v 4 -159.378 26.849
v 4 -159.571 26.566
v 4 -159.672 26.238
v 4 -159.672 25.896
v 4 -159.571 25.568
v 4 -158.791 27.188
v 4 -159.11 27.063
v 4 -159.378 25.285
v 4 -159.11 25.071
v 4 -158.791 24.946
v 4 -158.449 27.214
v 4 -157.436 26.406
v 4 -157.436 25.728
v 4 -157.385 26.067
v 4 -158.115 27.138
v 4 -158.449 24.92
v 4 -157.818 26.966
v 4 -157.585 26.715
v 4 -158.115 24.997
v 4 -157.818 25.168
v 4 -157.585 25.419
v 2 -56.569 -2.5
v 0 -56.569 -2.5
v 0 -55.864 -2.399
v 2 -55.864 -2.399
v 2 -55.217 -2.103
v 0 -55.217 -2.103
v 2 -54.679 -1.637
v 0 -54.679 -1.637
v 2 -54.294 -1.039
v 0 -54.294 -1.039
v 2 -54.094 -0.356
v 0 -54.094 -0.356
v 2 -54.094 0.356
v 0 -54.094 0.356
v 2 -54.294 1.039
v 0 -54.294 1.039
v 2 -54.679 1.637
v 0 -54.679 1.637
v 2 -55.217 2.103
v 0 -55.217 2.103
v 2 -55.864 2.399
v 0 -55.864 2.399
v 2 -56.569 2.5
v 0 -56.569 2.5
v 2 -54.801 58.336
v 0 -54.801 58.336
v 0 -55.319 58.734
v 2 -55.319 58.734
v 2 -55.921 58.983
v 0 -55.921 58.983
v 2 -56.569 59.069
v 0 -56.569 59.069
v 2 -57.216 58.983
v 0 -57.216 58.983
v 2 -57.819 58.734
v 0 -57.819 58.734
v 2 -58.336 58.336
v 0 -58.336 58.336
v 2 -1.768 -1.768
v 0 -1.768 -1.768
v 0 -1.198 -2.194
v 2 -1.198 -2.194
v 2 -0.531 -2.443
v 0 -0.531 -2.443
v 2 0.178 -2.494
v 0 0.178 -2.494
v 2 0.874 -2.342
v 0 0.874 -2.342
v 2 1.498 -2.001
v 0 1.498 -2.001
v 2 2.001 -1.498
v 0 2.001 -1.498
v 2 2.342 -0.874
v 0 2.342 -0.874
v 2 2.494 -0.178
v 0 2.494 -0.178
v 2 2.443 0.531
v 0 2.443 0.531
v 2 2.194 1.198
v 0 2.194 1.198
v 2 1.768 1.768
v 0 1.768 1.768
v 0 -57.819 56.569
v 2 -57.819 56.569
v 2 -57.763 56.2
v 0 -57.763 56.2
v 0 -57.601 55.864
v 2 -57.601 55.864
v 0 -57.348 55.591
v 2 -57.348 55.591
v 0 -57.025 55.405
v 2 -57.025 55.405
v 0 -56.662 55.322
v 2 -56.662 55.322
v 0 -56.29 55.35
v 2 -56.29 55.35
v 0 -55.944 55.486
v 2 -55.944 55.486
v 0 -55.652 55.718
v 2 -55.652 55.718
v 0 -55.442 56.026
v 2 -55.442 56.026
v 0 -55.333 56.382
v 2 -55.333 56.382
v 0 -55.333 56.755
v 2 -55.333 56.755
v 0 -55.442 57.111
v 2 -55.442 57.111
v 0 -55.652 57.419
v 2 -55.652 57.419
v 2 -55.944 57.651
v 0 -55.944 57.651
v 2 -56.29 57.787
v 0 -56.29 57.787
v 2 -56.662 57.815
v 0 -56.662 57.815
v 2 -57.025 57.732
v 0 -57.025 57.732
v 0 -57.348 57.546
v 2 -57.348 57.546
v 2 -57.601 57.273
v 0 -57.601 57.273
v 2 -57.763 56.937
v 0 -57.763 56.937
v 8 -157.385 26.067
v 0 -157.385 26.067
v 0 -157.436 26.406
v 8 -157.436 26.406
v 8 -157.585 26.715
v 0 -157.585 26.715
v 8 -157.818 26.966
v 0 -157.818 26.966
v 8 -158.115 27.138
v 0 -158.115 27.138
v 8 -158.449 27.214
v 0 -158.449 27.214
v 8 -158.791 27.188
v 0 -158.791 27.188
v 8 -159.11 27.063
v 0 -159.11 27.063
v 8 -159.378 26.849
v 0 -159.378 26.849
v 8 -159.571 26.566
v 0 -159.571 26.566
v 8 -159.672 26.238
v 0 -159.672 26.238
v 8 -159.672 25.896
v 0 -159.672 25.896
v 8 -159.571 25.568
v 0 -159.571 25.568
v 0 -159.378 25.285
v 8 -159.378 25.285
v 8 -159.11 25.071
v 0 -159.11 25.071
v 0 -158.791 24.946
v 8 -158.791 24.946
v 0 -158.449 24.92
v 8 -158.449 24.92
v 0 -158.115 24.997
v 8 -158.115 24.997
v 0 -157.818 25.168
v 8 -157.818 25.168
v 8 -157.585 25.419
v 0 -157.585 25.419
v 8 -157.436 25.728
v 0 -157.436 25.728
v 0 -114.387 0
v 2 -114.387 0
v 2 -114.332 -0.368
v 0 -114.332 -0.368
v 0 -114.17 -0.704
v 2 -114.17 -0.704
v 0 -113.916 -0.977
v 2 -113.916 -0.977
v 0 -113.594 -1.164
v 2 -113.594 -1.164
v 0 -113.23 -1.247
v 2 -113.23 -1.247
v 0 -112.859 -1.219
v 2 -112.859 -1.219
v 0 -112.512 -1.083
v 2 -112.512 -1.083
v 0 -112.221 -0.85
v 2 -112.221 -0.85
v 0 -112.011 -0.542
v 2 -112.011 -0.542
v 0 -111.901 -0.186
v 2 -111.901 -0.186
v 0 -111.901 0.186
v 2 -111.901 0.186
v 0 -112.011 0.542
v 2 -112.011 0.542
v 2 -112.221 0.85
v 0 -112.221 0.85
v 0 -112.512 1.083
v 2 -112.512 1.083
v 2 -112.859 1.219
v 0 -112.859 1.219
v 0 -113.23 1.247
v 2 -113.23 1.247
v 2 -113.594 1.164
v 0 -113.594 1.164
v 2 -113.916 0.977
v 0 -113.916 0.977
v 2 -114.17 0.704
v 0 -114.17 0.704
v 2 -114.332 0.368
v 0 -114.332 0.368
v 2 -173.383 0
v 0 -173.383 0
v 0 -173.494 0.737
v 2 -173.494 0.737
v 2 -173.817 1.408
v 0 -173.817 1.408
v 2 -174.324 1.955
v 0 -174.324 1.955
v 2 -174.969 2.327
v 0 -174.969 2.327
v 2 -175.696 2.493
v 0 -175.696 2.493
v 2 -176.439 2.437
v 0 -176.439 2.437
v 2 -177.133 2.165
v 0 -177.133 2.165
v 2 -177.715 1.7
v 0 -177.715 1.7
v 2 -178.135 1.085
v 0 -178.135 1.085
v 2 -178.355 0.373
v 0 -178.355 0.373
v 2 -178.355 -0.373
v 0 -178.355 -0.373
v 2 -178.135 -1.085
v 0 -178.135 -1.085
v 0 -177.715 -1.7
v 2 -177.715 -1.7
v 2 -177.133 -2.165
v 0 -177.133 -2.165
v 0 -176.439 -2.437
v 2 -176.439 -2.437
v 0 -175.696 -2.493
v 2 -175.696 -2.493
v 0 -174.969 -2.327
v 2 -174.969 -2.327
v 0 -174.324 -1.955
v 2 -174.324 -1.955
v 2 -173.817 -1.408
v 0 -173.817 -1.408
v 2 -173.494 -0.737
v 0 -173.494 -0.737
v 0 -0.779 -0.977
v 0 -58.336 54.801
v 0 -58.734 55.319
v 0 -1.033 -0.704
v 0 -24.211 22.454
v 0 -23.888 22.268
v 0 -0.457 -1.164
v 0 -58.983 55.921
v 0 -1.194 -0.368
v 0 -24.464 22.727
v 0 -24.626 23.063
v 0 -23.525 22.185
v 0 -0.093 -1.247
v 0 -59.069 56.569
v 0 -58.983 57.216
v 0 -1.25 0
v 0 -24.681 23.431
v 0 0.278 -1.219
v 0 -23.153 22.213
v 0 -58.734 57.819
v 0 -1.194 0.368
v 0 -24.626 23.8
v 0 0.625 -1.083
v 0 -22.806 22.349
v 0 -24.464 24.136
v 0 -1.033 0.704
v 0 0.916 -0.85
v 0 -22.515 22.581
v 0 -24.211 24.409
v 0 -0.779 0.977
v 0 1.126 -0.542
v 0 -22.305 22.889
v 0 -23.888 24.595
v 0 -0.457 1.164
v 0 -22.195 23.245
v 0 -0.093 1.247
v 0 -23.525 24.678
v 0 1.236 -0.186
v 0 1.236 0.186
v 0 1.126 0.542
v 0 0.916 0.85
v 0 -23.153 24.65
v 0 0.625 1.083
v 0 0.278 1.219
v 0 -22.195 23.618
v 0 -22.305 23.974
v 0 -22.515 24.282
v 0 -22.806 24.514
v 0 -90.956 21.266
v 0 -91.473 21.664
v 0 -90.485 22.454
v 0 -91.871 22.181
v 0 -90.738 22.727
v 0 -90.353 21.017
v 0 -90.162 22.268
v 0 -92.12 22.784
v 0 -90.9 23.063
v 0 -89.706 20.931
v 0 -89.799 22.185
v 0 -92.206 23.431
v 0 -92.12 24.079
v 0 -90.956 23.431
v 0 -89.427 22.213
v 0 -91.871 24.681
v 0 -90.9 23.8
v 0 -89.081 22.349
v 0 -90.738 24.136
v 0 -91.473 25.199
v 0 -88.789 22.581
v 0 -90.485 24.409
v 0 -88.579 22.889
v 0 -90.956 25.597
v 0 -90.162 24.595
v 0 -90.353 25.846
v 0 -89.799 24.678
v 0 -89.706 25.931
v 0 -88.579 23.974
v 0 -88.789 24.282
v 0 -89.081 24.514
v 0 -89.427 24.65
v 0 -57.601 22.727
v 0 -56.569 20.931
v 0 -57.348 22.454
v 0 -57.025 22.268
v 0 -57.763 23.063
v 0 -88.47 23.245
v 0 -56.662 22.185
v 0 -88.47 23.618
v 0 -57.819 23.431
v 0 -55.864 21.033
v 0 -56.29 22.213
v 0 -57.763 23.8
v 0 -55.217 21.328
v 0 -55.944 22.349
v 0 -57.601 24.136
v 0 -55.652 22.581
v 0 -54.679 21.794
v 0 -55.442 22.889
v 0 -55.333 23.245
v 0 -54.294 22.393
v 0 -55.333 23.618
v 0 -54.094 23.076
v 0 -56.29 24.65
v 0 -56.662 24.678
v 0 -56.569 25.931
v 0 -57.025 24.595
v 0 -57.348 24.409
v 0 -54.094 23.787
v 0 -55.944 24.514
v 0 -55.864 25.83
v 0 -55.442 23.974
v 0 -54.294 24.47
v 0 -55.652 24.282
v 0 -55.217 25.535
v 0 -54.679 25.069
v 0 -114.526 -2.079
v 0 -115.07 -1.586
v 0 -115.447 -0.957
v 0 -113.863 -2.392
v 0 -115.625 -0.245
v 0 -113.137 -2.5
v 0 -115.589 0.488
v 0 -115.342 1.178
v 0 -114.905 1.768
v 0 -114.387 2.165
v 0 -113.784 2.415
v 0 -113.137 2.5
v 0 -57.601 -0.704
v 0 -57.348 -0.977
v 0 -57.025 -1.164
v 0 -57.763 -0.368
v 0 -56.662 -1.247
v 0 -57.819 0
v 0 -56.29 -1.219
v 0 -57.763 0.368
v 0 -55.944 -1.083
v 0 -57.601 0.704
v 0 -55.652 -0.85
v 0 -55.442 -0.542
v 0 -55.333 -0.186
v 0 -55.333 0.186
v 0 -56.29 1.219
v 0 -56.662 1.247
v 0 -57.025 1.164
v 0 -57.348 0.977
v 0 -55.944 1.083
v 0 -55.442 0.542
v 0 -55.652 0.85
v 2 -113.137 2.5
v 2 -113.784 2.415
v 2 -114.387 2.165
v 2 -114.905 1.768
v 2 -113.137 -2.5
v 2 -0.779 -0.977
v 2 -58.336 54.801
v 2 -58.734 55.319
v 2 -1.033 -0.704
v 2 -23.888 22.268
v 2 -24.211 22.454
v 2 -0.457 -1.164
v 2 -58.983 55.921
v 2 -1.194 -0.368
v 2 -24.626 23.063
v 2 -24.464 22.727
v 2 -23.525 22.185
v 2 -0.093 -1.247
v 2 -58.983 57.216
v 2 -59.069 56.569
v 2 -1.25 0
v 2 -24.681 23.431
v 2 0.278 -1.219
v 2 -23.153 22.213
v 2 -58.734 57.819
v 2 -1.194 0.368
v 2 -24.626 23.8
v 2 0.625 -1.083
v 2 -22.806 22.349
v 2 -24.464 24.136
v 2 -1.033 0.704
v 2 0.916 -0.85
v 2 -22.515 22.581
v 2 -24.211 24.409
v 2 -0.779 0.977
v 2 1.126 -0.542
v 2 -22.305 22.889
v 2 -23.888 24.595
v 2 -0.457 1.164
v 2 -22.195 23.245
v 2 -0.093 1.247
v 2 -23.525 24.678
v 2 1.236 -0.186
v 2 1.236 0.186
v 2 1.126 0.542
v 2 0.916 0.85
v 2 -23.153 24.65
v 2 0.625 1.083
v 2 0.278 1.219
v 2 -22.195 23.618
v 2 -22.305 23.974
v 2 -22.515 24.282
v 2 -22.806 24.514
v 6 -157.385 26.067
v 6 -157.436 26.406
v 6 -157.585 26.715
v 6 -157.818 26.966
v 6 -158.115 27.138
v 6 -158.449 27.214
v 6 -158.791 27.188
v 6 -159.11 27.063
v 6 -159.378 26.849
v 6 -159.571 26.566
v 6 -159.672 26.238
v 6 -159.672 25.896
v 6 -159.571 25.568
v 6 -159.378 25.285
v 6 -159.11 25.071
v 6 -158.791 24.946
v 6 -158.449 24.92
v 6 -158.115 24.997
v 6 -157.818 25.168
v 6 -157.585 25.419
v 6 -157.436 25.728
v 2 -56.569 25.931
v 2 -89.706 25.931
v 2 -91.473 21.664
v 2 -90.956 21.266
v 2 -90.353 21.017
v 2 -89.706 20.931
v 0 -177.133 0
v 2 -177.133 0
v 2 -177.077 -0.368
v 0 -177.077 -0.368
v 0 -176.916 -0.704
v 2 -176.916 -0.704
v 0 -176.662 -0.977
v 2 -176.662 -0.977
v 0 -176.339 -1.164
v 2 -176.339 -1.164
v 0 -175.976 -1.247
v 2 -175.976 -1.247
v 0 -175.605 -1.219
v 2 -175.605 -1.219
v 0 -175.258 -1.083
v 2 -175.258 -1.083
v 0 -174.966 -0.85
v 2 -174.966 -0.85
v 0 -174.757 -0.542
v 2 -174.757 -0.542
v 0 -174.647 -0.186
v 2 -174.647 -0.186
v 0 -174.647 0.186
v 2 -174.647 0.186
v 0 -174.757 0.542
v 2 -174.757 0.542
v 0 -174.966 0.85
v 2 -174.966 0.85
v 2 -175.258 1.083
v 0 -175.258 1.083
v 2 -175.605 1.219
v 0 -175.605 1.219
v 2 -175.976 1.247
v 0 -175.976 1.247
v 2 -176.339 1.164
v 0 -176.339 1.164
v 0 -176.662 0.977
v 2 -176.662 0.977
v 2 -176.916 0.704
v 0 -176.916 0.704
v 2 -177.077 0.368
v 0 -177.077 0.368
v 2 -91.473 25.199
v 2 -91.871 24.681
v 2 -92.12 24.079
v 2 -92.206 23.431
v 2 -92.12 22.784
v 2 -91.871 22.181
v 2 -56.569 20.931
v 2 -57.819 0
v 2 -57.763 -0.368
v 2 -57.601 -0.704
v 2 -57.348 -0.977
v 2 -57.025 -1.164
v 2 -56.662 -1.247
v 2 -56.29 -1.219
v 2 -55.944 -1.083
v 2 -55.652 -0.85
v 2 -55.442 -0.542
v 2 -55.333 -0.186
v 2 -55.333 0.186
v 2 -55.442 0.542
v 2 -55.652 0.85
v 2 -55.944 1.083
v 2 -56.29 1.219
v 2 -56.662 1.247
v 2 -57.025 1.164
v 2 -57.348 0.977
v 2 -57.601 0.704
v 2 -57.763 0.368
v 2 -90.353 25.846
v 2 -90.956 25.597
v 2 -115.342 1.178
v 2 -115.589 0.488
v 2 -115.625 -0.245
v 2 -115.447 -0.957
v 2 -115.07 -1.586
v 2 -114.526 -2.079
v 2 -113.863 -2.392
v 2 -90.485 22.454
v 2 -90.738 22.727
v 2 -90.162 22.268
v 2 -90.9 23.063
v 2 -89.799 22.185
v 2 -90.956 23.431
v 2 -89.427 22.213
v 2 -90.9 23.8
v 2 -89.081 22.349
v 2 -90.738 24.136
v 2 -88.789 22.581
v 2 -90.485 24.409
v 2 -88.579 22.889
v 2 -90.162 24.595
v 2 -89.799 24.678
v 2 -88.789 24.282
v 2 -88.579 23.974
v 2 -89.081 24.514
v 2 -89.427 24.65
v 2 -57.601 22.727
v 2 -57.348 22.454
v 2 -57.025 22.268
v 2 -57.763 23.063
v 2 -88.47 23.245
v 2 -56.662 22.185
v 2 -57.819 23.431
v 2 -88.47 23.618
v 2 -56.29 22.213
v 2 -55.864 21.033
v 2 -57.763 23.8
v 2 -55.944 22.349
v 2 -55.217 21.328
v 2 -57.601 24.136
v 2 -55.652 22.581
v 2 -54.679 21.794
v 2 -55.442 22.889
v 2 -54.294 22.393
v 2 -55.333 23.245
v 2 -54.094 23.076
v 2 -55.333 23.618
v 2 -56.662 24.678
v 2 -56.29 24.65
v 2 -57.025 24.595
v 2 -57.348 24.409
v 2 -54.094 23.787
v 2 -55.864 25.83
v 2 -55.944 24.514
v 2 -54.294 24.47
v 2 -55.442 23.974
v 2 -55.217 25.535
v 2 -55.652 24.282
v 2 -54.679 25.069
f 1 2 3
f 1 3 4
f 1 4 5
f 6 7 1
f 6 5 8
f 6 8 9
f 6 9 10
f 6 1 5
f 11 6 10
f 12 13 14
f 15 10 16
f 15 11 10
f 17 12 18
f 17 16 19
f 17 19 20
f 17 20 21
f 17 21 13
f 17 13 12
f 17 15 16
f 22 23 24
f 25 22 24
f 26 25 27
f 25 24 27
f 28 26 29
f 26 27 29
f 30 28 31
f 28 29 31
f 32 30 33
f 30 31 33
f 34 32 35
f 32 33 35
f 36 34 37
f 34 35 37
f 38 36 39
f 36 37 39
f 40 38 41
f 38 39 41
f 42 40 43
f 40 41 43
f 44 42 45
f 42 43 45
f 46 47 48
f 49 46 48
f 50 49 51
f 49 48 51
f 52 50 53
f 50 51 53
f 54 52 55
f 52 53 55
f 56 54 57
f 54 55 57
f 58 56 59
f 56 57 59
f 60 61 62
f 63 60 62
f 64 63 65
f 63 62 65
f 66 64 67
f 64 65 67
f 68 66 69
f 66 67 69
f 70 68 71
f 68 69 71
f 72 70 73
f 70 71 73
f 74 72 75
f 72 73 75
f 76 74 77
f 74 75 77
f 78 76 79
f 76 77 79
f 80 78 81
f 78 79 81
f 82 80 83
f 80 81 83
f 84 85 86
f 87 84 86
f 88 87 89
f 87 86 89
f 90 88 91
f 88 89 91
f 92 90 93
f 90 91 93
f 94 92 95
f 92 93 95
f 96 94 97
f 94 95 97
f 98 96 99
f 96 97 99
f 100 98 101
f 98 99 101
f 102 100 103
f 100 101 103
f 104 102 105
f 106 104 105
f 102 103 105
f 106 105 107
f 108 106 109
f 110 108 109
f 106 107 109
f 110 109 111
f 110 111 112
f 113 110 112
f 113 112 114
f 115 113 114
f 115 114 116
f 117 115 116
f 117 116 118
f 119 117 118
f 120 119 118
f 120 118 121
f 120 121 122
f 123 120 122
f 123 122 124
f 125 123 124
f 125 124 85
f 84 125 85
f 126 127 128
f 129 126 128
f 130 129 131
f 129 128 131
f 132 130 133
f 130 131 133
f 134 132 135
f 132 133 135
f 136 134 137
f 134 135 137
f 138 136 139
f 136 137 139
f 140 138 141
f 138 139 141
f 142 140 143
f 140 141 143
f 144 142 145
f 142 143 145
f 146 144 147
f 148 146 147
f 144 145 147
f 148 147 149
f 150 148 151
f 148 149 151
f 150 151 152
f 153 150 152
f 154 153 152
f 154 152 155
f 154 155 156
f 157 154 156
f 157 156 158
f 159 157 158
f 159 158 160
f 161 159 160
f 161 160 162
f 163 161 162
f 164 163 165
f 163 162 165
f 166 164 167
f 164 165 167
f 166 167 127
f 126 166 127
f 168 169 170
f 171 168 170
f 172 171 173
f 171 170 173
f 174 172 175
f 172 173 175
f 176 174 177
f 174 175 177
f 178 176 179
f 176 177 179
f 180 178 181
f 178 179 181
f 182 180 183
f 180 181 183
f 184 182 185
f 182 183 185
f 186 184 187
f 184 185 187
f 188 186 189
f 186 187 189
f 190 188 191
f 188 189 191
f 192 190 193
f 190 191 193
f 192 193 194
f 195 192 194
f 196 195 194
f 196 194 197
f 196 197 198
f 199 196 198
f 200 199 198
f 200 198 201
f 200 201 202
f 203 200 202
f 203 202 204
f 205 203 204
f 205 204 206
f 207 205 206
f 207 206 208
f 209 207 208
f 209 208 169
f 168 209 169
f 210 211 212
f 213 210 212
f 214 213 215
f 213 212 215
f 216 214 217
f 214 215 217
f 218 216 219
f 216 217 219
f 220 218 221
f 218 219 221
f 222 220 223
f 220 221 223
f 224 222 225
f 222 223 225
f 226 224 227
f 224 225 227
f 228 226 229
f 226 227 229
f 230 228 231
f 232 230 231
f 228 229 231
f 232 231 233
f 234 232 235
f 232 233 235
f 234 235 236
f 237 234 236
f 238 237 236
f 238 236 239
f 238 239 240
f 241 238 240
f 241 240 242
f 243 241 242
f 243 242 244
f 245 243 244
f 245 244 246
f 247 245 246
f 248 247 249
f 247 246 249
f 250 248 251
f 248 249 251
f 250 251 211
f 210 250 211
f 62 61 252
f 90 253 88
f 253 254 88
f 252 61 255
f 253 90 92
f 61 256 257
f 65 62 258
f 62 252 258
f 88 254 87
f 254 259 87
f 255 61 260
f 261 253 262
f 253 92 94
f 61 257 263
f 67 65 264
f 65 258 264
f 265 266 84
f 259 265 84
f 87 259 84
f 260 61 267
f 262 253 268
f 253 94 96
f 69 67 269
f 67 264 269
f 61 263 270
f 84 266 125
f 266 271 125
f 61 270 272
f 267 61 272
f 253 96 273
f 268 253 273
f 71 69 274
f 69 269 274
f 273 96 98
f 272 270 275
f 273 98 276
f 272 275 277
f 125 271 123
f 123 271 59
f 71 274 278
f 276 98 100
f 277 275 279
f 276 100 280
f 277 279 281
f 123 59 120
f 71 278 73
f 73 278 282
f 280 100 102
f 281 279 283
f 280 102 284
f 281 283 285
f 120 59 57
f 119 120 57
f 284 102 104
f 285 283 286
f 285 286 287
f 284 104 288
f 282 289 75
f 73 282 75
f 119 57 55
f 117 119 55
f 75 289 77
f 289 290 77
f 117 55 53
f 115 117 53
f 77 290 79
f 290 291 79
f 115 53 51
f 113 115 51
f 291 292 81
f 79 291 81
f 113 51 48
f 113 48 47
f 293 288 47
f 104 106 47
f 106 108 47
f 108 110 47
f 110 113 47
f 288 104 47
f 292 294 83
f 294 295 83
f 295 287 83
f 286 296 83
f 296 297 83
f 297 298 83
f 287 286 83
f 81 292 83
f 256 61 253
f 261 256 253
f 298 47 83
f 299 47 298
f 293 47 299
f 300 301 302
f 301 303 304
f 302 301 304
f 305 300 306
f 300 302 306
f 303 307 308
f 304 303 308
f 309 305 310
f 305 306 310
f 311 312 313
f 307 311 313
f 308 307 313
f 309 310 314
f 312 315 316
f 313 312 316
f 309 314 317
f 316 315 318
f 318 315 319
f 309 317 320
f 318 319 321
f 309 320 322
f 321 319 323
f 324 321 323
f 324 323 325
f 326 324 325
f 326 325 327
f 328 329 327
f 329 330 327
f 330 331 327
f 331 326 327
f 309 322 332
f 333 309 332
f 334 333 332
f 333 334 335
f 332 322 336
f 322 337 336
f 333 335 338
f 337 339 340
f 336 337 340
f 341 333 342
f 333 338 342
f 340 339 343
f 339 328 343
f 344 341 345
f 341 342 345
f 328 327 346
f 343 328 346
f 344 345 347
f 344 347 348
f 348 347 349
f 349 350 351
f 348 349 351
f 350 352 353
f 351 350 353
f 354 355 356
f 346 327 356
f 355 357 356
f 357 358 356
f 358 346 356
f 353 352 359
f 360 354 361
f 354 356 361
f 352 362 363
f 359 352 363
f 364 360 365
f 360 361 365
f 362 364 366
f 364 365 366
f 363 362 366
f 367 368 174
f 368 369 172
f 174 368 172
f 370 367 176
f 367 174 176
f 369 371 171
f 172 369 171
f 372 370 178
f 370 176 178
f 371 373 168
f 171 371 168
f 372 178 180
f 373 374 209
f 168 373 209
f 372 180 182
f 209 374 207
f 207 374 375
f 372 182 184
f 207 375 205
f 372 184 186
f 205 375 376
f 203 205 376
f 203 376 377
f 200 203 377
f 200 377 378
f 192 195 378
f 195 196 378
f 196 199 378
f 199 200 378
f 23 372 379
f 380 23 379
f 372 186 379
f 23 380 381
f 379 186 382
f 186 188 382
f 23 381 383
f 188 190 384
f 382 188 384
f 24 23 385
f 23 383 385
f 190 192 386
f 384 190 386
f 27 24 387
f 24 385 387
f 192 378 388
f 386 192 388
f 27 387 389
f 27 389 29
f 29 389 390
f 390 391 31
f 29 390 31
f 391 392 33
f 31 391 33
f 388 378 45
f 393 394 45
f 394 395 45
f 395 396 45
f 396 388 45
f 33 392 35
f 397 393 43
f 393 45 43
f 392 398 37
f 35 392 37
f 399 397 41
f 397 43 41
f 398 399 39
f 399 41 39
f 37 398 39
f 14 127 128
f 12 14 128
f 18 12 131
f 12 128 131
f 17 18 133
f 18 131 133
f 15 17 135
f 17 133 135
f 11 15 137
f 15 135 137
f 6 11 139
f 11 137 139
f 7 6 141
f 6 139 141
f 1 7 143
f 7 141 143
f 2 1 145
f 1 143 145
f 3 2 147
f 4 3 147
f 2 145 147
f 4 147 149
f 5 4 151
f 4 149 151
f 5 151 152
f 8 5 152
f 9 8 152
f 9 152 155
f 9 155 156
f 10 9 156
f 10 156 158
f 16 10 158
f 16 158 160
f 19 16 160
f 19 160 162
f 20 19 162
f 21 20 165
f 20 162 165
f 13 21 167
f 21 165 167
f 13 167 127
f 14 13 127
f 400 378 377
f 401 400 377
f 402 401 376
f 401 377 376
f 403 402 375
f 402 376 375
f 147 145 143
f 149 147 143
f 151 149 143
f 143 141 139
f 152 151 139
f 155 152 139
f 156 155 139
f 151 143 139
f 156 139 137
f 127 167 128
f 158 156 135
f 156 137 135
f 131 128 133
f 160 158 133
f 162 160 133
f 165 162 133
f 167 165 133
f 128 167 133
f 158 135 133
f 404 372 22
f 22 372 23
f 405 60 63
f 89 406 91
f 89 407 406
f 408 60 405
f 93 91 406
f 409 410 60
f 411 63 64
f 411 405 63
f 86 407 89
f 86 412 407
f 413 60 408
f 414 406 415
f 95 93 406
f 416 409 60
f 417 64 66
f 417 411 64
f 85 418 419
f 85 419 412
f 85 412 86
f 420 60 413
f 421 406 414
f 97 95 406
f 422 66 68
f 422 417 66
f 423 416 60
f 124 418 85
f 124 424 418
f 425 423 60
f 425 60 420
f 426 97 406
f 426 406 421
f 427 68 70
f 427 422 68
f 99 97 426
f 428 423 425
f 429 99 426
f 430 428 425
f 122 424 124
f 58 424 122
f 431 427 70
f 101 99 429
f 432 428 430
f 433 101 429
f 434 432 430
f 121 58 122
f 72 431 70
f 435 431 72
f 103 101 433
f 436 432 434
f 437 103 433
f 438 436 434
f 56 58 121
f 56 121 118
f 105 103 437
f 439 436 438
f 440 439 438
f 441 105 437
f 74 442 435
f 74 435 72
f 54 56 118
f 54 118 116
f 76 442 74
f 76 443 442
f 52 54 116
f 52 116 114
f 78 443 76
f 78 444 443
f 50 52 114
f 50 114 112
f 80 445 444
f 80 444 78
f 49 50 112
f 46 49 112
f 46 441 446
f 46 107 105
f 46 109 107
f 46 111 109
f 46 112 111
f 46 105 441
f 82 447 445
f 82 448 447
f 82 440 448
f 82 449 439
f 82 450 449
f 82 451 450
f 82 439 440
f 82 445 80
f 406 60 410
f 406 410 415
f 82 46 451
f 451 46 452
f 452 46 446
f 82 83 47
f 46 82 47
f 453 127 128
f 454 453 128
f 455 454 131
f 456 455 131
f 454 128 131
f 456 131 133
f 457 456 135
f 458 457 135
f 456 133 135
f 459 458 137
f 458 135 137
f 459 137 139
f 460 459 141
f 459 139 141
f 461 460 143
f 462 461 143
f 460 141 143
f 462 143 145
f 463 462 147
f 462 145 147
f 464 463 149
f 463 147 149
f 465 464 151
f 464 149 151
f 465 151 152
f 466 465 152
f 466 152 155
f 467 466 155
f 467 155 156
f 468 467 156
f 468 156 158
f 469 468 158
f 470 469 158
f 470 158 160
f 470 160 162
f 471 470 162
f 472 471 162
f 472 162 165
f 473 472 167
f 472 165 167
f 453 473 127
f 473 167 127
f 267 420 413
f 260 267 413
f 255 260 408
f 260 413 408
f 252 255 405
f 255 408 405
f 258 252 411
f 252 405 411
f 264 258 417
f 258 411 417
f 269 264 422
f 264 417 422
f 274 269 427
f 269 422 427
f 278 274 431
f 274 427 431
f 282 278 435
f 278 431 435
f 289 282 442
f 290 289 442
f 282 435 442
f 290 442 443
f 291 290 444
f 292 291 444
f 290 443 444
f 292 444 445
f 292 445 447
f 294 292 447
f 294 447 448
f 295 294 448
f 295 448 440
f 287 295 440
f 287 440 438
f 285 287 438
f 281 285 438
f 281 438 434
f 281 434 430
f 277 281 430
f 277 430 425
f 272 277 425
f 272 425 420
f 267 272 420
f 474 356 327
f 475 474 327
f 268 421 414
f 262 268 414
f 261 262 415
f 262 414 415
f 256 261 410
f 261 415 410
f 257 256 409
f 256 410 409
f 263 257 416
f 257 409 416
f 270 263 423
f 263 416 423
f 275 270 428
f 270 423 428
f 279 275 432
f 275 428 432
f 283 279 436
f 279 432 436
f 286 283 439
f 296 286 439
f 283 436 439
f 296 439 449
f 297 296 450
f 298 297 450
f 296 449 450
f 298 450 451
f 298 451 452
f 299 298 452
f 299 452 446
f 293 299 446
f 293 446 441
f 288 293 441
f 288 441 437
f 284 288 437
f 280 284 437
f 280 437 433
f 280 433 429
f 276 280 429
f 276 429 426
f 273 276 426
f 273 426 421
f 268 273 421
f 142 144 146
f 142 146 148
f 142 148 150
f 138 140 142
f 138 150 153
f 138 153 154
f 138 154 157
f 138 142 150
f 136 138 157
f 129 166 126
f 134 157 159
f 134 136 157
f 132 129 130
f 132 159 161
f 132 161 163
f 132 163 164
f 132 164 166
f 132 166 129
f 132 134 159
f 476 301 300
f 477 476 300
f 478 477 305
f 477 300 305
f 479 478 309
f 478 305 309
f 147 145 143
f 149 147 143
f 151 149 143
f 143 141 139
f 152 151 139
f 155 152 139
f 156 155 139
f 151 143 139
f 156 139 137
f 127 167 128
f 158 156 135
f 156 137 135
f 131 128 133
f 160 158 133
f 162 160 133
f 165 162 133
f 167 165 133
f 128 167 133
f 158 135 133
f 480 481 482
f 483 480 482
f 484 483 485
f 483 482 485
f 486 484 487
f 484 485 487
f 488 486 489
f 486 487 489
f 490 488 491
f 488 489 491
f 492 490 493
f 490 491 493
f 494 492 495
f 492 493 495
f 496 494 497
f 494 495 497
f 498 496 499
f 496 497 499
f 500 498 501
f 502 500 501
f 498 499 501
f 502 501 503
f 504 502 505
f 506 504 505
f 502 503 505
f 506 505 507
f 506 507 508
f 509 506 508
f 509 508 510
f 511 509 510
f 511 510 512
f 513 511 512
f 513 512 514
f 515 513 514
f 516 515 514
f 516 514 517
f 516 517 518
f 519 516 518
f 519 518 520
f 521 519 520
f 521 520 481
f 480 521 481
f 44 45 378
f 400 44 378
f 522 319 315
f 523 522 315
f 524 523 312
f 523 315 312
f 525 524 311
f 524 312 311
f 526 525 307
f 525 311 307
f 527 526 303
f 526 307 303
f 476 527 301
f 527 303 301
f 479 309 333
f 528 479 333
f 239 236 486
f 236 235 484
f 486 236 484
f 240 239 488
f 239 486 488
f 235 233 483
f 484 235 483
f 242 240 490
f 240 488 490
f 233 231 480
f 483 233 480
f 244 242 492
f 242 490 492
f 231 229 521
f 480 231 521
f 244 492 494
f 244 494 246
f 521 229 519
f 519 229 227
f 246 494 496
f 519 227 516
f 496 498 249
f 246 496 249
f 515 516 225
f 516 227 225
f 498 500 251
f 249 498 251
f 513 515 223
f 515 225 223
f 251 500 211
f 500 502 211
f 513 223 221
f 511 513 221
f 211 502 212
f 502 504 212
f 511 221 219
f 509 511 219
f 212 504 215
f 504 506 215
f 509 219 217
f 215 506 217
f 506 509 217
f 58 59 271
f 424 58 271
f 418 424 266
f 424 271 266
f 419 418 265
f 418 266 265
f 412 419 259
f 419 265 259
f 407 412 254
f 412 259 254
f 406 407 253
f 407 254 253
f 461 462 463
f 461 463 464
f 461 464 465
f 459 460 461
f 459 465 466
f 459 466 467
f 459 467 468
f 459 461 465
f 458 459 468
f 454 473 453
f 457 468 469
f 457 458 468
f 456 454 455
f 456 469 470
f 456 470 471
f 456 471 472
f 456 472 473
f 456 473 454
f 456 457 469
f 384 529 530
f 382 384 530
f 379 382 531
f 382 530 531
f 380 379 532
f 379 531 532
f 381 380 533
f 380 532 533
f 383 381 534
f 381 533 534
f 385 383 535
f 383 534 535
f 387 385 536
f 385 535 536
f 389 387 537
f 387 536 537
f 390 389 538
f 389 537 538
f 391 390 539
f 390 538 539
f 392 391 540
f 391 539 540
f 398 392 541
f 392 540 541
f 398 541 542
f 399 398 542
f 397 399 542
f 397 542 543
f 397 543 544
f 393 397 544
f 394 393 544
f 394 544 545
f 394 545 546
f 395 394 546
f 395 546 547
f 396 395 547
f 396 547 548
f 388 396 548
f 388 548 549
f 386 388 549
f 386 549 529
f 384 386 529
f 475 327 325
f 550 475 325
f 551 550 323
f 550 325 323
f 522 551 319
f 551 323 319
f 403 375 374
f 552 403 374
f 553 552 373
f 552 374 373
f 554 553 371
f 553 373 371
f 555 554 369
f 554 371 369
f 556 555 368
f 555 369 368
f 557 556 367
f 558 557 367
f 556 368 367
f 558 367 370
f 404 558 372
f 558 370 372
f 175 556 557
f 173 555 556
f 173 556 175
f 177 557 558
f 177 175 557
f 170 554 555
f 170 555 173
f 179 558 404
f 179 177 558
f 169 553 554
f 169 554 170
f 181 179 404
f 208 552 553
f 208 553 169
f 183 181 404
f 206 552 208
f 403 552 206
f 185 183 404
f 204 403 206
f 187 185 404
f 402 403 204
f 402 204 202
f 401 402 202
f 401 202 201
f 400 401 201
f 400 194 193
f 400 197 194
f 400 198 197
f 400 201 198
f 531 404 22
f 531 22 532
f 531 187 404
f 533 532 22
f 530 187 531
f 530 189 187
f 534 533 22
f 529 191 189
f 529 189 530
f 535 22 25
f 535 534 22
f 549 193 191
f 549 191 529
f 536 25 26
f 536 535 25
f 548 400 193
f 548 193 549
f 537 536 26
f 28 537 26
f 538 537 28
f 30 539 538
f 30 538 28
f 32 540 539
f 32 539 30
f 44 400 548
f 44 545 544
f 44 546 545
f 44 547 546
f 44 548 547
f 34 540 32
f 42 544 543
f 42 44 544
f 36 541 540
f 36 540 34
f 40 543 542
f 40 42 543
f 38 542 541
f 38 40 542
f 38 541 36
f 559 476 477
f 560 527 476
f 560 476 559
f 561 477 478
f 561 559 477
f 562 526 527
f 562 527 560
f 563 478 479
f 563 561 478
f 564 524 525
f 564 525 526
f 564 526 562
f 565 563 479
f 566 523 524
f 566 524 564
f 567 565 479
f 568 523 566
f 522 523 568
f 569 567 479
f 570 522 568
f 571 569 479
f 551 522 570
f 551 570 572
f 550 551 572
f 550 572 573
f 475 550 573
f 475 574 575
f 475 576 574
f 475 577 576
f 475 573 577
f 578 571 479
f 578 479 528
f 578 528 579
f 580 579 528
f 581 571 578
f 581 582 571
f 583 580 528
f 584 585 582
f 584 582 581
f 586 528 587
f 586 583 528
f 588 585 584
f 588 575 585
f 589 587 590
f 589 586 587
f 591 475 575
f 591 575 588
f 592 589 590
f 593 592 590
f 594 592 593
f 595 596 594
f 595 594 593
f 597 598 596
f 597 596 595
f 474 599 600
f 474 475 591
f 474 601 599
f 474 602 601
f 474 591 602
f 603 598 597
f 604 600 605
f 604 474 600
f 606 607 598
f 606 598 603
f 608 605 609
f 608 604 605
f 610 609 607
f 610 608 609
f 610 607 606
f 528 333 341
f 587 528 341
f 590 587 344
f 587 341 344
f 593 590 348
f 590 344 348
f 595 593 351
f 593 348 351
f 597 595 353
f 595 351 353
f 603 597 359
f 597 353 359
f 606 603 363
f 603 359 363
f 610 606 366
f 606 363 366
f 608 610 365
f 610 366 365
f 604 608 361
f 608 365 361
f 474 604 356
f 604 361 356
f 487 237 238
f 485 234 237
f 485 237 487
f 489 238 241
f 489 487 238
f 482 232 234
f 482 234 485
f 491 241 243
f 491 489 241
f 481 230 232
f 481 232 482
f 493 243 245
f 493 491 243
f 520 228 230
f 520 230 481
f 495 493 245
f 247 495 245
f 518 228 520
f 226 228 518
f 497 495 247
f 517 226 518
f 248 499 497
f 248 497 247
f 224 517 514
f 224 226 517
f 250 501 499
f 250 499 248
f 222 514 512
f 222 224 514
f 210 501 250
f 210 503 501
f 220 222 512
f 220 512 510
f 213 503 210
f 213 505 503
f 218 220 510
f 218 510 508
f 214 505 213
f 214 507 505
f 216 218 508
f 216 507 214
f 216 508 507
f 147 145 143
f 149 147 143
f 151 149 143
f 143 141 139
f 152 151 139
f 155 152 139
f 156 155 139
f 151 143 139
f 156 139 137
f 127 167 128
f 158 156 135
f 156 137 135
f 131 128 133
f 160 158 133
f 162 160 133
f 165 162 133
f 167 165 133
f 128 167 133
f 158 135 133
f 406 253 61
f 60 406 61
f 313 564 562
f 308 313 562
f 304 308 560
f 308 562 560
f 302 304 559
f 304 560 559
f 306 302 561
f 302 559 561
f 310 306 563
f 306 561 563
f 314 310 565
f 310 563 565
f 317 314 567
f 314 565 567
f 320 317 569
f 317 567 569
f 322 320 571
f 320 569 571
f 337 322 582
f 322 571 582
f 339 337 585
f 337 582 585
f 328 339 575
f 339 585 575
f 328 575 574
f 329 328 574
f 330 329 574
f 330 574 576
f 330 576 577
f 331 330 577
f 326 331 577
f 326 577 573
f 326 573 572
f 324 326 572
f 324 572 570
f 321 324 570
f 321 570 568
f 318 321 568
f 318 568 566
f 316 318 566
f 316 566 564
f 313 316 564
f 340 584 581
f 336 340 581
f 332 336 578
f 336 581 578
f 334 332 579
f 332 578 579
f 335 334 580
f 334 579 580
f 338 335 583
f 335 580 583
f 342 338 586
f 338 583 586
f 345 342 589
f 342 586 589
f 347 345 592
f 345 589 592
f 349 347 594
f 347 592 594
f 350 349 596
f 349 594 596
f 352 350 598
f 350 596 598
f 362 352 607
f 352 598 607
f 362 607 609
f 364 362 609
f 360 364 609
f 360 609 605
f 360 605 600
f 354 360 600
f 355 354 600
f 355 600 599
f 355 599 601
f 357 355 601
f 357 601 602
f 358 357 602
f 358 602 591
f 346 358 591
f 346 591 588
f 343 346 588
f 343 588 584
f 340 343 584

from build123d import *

# Parameters (mm, degrees)
F3_DEPTH  = 2
F4_DEPTH  = 2
F5_D      = 2.5
F5_2_D    = 2.5
F6_DEPTH  = 2
F7_D      = 2.5
F8_D      = 2.5
F2_R      = 2.5
F9_DEPTH  = 2
F10_D     = 2.5
F2_R_2    = 1.15
F11_DEPTH = 4
F12_DEPTH = 6
F13_DEPTH = 8


with BuildPart() as f3:
    # F2 (on Right) → F3 (new body)
    with BuildSketch(Plane.YZ):
        with BuildLine():
            ThreePointArc((-54.800775542, 58.3363094479), (-54.0685424949, 56.5685424949), (-54.800775542, 54.800775542))
            Line((-54.800775542, 54.800775542), (-56.5685424949, 53.033008589))
            Line((-56.5685424949, 53.033008589), (-1.767766953, -1.767766953))
            ThreePointArc((-1.767766953, -1.767766953), (1.767766953, -1.767766953), (1.767766953, 1.767766953))
            Line((1.767766953, 1.767766953), (-54.800775542, 58.3363094479))
        make_face()
        Polygon((-56.5685424949, 53.033008589), (-54.800775542, 54.800775542), (-56.5685424949, 56.5685424949), (-58.3363094479, 54.800775542), align=None)
        with BuildLine():
            Line((-56.5685424949, 56.5685424949), (-54.800775542, 54.800775542))
            ThreePointArc((-54.800775542, 54.800775542), (-54.0685424949, 56.5685424949), (-54.800775542, 58.3363094479))
            ThreePointArc((-54.800775542, 58.3363094479), (-56.5685424949, 59.0685424949), (-58.3363094479, 58.3363094479))
            ThreePointArc((-58.3363094479, 58.3363094479), (-59.0685424949, 56.5685424949), (-58.3363094479, 54.800775542))
            Line((-58.3363094479, 54.800775542), (-56.5685424949, 56.5685424949))
        make_face()
    extrude(amount=F3_DEPTH)

    # F5 (through all)
    with Locations(Plane(origin=(0, 0, 0), x_dir=(0, 1, 0), z_dir=(-1, 0, 0))):
        with Locations((-56.5685424949, 0), (-113.1370849898, 0), (0, 0), (-56.5685424949, -56.5685424949)):
            Hole(F5_D / 2)

    # F8 (through all)
    with Locations(Plane(origin=(0, 0, 0), x_dir=(0, 1, 0), z_dir=(-1, 0, 0))):
        with Locations((-23.4314575051, -23.4314575051)):
            Hole(F8_D / 2)


with BuildPart() as f4:
    # F2 (on Right) → F4 (new body)
    with BuildSketch(Plane.YZ):
        with BuildLine():
            ThreePointArc((-111.3693180369, -1.767766953), (-112.1803764089, -2.3096988313), (-113.1370849898, -2.5))
            Line((-113.1370849898, -2.5), (-56.5685424949, -2.5))
            ThreePointArc((-56.5685424949, -2.5), (-54.0685424949, 0), (-56.5685424949, 2.5))
            Line((-56.5685424949, 2.5), (-107.1015510839, 2.5))
            Line((-107.1015510839, 2.5), (-109.6015510839, 0))
            Line((-109.6015510839, 0), (-111.3693180369, -1.767766953))
        make_face()
        Polygon((-107.1015510839, 2.5), (-110.6370849898, 2.5), (-113.1370849898, 0), (-109.6015510839, 0), align=None)
        with BuildLine():
            ThreePointArc((-113.1370849898, 2.5), (-114.0937935708, 2.3096988313), (-114.9048519428, 1.767766953))
            ThreePointArc((-114.9048519428, 1.767766953), (-115.4467838211, -0.9567085809), (-113.1370849898, -2.5))
            ThreePointArc((-113.1370849898, -2.5), (-112.1803764089, -2.3096988313), (-111.3693180369, -1.767766953))
            Line((-111.3693180369, -1.767766953), (-109.6015510839, 0))
            Line((-109.6015510839, 0), (-113.1370849898, 0))
            Line((-113.1370849898, 0), (-110.6370849898, 2.5))
            Line((-110.6370849898, 2.5), (-113.1370849898, 2.5))
        make_face()
    extrude(amount=F4_DEPTH)

    # F5#2 (through all)
    with Locations(Plane(origin=(0, 0, 0), x_dir=(0, 1, 0), z_dir=(-1, 0, 0))):
        with Locations((-56.5685424949, 0), (-113.1370849898, 0), (0, 0), (-56.5685424949, -56.5685424949)):
            Hole(F5_2_D / 2)


with BuildPart() as f6:
    # F2 (on Right) → F6 (new body)
    with BuildSketch(Plane.YZ):
        with BuildLine():
            Line((-56.5685424949, 25.9314575051), (-83.6700935788, 25.9314575051))
            Line((-83.6700935788, 25.9314575051), (-86.1700935788, 23.4314575051))
            Line((-86.1700935788, 23.4314575051), (-88.6700935788, 20.9314575051))
            Line((-88.6700935788, 20.9314575051), (-56.5685424949, 20.9314575051))
            ThreePointArc((-56.5685424949, 20.9314575051), (-54.0685424949, 23.4314575051), (-56.5685424949, 25.9314575051))
        make_face()
        Polygon((-86.1700935788, 23.4314575051), (-83.6700935788, 25.9314575051), (-87.2056274848, 25.9314575051), (-89.7056274848, 23.4314575051), align=None)
        with BuildLine():
            Line((-89.7056274848, 23.4314575051), (-87.2056274848, 25.9314575051))
            Line((-87.2056274848, 25.9314575051), (-89.7056274848, 25.9314575051))
            ThreePointArc((-89.7056274848, 25.9314575051), (-90.6623360391, 25.7411563474), (-91.473394397, 25.1992244988))
            ThreePointArc((-91.473394397, 25.1992244988), (-92.2056274848, 23.4314575339), (-91.4733944377, 21.6636905521))
            Line((-91.4733944377, 21.6636905521), (-89.7056274848, 23.4314575051))
        make_face()
        with BuildLine():
            Line((-88.6700935788, 20.9314575051), (-86.1700935788, 23.4314575051))
            Line((-86.1700935788, 23.4314575051), (-89.7056274848, 23.4314575051))
            Line((-89.7056274848, 23.4314575051), (-91.4733944377, 21.6636905521))
            ThreePointArc((-91.4733944377, 21.6636905521), (-90.6623360657, 21.1217586738), (-89.7056274848, 20.9314575051))
            Line((-89.7056274848, 20.9314575051), (-88.6700935788, 20.9314575051))
        make_face()
    extrude(amount=F6_DEPTH)

    # F7 (through all)
    with Locations(Plane(origin=(0, 0, 0), x_dir=(0, 1, 0), z_dir=(-1, 0, 0))):
        with Locations((-89.7056274848, -23.4314575051), (-56.5685424949, -23.4314575051)):
            Hole(F7_D / 2)


with BuildPart() as f9:
    # F2 (on Right) → F9 (new body)
    with BuildSketch(Plane.YZ):
        with Locations((-175.8827120066, 0)):
            Circle(F2_R)
    extrude(amount=F9_DEPTH)

    # F10 (through all)
    with Locations(Plane(origin=(0, 0, 0), x_dir=(0, 1, 0), z_dir=(-1, 0, 0))):
        with Locations((-175.8827120066, 0)):
            Hole(F10_D / 2)


with BuildPart() as f11:
    # F2 (on Right) → F11 (new body)
    with BuildSketch(Plane.YZ):
        with Locations((-158.534809947, 26.0670315474)):
            Circle(F2_R_2)
    extrude(amount=F11_DEPTH)


with BuildPart() as f12:
    # F2 (on Right) → F12 (new body)
    with BuildSketch(Plane.YZ):
        with Locations((-158.534809947, 26.0670315474)):
            Circle(F2_R_2)
    extrude(amount=F12_DEPTH)


with BuildPart() as f13:
    # F2 (on Right) → F13 (new body)
    with BuildSketch(Plane.YZ):
        with Locations((-158.534809947, 26.0670315474)):
            Circle(F2_R_2)
    extrude(amount=F13_DEPTH)


solid = Compound([f3.part, f4.part, f6.part, f9.part, f11.part, f12.part, f13.part])
